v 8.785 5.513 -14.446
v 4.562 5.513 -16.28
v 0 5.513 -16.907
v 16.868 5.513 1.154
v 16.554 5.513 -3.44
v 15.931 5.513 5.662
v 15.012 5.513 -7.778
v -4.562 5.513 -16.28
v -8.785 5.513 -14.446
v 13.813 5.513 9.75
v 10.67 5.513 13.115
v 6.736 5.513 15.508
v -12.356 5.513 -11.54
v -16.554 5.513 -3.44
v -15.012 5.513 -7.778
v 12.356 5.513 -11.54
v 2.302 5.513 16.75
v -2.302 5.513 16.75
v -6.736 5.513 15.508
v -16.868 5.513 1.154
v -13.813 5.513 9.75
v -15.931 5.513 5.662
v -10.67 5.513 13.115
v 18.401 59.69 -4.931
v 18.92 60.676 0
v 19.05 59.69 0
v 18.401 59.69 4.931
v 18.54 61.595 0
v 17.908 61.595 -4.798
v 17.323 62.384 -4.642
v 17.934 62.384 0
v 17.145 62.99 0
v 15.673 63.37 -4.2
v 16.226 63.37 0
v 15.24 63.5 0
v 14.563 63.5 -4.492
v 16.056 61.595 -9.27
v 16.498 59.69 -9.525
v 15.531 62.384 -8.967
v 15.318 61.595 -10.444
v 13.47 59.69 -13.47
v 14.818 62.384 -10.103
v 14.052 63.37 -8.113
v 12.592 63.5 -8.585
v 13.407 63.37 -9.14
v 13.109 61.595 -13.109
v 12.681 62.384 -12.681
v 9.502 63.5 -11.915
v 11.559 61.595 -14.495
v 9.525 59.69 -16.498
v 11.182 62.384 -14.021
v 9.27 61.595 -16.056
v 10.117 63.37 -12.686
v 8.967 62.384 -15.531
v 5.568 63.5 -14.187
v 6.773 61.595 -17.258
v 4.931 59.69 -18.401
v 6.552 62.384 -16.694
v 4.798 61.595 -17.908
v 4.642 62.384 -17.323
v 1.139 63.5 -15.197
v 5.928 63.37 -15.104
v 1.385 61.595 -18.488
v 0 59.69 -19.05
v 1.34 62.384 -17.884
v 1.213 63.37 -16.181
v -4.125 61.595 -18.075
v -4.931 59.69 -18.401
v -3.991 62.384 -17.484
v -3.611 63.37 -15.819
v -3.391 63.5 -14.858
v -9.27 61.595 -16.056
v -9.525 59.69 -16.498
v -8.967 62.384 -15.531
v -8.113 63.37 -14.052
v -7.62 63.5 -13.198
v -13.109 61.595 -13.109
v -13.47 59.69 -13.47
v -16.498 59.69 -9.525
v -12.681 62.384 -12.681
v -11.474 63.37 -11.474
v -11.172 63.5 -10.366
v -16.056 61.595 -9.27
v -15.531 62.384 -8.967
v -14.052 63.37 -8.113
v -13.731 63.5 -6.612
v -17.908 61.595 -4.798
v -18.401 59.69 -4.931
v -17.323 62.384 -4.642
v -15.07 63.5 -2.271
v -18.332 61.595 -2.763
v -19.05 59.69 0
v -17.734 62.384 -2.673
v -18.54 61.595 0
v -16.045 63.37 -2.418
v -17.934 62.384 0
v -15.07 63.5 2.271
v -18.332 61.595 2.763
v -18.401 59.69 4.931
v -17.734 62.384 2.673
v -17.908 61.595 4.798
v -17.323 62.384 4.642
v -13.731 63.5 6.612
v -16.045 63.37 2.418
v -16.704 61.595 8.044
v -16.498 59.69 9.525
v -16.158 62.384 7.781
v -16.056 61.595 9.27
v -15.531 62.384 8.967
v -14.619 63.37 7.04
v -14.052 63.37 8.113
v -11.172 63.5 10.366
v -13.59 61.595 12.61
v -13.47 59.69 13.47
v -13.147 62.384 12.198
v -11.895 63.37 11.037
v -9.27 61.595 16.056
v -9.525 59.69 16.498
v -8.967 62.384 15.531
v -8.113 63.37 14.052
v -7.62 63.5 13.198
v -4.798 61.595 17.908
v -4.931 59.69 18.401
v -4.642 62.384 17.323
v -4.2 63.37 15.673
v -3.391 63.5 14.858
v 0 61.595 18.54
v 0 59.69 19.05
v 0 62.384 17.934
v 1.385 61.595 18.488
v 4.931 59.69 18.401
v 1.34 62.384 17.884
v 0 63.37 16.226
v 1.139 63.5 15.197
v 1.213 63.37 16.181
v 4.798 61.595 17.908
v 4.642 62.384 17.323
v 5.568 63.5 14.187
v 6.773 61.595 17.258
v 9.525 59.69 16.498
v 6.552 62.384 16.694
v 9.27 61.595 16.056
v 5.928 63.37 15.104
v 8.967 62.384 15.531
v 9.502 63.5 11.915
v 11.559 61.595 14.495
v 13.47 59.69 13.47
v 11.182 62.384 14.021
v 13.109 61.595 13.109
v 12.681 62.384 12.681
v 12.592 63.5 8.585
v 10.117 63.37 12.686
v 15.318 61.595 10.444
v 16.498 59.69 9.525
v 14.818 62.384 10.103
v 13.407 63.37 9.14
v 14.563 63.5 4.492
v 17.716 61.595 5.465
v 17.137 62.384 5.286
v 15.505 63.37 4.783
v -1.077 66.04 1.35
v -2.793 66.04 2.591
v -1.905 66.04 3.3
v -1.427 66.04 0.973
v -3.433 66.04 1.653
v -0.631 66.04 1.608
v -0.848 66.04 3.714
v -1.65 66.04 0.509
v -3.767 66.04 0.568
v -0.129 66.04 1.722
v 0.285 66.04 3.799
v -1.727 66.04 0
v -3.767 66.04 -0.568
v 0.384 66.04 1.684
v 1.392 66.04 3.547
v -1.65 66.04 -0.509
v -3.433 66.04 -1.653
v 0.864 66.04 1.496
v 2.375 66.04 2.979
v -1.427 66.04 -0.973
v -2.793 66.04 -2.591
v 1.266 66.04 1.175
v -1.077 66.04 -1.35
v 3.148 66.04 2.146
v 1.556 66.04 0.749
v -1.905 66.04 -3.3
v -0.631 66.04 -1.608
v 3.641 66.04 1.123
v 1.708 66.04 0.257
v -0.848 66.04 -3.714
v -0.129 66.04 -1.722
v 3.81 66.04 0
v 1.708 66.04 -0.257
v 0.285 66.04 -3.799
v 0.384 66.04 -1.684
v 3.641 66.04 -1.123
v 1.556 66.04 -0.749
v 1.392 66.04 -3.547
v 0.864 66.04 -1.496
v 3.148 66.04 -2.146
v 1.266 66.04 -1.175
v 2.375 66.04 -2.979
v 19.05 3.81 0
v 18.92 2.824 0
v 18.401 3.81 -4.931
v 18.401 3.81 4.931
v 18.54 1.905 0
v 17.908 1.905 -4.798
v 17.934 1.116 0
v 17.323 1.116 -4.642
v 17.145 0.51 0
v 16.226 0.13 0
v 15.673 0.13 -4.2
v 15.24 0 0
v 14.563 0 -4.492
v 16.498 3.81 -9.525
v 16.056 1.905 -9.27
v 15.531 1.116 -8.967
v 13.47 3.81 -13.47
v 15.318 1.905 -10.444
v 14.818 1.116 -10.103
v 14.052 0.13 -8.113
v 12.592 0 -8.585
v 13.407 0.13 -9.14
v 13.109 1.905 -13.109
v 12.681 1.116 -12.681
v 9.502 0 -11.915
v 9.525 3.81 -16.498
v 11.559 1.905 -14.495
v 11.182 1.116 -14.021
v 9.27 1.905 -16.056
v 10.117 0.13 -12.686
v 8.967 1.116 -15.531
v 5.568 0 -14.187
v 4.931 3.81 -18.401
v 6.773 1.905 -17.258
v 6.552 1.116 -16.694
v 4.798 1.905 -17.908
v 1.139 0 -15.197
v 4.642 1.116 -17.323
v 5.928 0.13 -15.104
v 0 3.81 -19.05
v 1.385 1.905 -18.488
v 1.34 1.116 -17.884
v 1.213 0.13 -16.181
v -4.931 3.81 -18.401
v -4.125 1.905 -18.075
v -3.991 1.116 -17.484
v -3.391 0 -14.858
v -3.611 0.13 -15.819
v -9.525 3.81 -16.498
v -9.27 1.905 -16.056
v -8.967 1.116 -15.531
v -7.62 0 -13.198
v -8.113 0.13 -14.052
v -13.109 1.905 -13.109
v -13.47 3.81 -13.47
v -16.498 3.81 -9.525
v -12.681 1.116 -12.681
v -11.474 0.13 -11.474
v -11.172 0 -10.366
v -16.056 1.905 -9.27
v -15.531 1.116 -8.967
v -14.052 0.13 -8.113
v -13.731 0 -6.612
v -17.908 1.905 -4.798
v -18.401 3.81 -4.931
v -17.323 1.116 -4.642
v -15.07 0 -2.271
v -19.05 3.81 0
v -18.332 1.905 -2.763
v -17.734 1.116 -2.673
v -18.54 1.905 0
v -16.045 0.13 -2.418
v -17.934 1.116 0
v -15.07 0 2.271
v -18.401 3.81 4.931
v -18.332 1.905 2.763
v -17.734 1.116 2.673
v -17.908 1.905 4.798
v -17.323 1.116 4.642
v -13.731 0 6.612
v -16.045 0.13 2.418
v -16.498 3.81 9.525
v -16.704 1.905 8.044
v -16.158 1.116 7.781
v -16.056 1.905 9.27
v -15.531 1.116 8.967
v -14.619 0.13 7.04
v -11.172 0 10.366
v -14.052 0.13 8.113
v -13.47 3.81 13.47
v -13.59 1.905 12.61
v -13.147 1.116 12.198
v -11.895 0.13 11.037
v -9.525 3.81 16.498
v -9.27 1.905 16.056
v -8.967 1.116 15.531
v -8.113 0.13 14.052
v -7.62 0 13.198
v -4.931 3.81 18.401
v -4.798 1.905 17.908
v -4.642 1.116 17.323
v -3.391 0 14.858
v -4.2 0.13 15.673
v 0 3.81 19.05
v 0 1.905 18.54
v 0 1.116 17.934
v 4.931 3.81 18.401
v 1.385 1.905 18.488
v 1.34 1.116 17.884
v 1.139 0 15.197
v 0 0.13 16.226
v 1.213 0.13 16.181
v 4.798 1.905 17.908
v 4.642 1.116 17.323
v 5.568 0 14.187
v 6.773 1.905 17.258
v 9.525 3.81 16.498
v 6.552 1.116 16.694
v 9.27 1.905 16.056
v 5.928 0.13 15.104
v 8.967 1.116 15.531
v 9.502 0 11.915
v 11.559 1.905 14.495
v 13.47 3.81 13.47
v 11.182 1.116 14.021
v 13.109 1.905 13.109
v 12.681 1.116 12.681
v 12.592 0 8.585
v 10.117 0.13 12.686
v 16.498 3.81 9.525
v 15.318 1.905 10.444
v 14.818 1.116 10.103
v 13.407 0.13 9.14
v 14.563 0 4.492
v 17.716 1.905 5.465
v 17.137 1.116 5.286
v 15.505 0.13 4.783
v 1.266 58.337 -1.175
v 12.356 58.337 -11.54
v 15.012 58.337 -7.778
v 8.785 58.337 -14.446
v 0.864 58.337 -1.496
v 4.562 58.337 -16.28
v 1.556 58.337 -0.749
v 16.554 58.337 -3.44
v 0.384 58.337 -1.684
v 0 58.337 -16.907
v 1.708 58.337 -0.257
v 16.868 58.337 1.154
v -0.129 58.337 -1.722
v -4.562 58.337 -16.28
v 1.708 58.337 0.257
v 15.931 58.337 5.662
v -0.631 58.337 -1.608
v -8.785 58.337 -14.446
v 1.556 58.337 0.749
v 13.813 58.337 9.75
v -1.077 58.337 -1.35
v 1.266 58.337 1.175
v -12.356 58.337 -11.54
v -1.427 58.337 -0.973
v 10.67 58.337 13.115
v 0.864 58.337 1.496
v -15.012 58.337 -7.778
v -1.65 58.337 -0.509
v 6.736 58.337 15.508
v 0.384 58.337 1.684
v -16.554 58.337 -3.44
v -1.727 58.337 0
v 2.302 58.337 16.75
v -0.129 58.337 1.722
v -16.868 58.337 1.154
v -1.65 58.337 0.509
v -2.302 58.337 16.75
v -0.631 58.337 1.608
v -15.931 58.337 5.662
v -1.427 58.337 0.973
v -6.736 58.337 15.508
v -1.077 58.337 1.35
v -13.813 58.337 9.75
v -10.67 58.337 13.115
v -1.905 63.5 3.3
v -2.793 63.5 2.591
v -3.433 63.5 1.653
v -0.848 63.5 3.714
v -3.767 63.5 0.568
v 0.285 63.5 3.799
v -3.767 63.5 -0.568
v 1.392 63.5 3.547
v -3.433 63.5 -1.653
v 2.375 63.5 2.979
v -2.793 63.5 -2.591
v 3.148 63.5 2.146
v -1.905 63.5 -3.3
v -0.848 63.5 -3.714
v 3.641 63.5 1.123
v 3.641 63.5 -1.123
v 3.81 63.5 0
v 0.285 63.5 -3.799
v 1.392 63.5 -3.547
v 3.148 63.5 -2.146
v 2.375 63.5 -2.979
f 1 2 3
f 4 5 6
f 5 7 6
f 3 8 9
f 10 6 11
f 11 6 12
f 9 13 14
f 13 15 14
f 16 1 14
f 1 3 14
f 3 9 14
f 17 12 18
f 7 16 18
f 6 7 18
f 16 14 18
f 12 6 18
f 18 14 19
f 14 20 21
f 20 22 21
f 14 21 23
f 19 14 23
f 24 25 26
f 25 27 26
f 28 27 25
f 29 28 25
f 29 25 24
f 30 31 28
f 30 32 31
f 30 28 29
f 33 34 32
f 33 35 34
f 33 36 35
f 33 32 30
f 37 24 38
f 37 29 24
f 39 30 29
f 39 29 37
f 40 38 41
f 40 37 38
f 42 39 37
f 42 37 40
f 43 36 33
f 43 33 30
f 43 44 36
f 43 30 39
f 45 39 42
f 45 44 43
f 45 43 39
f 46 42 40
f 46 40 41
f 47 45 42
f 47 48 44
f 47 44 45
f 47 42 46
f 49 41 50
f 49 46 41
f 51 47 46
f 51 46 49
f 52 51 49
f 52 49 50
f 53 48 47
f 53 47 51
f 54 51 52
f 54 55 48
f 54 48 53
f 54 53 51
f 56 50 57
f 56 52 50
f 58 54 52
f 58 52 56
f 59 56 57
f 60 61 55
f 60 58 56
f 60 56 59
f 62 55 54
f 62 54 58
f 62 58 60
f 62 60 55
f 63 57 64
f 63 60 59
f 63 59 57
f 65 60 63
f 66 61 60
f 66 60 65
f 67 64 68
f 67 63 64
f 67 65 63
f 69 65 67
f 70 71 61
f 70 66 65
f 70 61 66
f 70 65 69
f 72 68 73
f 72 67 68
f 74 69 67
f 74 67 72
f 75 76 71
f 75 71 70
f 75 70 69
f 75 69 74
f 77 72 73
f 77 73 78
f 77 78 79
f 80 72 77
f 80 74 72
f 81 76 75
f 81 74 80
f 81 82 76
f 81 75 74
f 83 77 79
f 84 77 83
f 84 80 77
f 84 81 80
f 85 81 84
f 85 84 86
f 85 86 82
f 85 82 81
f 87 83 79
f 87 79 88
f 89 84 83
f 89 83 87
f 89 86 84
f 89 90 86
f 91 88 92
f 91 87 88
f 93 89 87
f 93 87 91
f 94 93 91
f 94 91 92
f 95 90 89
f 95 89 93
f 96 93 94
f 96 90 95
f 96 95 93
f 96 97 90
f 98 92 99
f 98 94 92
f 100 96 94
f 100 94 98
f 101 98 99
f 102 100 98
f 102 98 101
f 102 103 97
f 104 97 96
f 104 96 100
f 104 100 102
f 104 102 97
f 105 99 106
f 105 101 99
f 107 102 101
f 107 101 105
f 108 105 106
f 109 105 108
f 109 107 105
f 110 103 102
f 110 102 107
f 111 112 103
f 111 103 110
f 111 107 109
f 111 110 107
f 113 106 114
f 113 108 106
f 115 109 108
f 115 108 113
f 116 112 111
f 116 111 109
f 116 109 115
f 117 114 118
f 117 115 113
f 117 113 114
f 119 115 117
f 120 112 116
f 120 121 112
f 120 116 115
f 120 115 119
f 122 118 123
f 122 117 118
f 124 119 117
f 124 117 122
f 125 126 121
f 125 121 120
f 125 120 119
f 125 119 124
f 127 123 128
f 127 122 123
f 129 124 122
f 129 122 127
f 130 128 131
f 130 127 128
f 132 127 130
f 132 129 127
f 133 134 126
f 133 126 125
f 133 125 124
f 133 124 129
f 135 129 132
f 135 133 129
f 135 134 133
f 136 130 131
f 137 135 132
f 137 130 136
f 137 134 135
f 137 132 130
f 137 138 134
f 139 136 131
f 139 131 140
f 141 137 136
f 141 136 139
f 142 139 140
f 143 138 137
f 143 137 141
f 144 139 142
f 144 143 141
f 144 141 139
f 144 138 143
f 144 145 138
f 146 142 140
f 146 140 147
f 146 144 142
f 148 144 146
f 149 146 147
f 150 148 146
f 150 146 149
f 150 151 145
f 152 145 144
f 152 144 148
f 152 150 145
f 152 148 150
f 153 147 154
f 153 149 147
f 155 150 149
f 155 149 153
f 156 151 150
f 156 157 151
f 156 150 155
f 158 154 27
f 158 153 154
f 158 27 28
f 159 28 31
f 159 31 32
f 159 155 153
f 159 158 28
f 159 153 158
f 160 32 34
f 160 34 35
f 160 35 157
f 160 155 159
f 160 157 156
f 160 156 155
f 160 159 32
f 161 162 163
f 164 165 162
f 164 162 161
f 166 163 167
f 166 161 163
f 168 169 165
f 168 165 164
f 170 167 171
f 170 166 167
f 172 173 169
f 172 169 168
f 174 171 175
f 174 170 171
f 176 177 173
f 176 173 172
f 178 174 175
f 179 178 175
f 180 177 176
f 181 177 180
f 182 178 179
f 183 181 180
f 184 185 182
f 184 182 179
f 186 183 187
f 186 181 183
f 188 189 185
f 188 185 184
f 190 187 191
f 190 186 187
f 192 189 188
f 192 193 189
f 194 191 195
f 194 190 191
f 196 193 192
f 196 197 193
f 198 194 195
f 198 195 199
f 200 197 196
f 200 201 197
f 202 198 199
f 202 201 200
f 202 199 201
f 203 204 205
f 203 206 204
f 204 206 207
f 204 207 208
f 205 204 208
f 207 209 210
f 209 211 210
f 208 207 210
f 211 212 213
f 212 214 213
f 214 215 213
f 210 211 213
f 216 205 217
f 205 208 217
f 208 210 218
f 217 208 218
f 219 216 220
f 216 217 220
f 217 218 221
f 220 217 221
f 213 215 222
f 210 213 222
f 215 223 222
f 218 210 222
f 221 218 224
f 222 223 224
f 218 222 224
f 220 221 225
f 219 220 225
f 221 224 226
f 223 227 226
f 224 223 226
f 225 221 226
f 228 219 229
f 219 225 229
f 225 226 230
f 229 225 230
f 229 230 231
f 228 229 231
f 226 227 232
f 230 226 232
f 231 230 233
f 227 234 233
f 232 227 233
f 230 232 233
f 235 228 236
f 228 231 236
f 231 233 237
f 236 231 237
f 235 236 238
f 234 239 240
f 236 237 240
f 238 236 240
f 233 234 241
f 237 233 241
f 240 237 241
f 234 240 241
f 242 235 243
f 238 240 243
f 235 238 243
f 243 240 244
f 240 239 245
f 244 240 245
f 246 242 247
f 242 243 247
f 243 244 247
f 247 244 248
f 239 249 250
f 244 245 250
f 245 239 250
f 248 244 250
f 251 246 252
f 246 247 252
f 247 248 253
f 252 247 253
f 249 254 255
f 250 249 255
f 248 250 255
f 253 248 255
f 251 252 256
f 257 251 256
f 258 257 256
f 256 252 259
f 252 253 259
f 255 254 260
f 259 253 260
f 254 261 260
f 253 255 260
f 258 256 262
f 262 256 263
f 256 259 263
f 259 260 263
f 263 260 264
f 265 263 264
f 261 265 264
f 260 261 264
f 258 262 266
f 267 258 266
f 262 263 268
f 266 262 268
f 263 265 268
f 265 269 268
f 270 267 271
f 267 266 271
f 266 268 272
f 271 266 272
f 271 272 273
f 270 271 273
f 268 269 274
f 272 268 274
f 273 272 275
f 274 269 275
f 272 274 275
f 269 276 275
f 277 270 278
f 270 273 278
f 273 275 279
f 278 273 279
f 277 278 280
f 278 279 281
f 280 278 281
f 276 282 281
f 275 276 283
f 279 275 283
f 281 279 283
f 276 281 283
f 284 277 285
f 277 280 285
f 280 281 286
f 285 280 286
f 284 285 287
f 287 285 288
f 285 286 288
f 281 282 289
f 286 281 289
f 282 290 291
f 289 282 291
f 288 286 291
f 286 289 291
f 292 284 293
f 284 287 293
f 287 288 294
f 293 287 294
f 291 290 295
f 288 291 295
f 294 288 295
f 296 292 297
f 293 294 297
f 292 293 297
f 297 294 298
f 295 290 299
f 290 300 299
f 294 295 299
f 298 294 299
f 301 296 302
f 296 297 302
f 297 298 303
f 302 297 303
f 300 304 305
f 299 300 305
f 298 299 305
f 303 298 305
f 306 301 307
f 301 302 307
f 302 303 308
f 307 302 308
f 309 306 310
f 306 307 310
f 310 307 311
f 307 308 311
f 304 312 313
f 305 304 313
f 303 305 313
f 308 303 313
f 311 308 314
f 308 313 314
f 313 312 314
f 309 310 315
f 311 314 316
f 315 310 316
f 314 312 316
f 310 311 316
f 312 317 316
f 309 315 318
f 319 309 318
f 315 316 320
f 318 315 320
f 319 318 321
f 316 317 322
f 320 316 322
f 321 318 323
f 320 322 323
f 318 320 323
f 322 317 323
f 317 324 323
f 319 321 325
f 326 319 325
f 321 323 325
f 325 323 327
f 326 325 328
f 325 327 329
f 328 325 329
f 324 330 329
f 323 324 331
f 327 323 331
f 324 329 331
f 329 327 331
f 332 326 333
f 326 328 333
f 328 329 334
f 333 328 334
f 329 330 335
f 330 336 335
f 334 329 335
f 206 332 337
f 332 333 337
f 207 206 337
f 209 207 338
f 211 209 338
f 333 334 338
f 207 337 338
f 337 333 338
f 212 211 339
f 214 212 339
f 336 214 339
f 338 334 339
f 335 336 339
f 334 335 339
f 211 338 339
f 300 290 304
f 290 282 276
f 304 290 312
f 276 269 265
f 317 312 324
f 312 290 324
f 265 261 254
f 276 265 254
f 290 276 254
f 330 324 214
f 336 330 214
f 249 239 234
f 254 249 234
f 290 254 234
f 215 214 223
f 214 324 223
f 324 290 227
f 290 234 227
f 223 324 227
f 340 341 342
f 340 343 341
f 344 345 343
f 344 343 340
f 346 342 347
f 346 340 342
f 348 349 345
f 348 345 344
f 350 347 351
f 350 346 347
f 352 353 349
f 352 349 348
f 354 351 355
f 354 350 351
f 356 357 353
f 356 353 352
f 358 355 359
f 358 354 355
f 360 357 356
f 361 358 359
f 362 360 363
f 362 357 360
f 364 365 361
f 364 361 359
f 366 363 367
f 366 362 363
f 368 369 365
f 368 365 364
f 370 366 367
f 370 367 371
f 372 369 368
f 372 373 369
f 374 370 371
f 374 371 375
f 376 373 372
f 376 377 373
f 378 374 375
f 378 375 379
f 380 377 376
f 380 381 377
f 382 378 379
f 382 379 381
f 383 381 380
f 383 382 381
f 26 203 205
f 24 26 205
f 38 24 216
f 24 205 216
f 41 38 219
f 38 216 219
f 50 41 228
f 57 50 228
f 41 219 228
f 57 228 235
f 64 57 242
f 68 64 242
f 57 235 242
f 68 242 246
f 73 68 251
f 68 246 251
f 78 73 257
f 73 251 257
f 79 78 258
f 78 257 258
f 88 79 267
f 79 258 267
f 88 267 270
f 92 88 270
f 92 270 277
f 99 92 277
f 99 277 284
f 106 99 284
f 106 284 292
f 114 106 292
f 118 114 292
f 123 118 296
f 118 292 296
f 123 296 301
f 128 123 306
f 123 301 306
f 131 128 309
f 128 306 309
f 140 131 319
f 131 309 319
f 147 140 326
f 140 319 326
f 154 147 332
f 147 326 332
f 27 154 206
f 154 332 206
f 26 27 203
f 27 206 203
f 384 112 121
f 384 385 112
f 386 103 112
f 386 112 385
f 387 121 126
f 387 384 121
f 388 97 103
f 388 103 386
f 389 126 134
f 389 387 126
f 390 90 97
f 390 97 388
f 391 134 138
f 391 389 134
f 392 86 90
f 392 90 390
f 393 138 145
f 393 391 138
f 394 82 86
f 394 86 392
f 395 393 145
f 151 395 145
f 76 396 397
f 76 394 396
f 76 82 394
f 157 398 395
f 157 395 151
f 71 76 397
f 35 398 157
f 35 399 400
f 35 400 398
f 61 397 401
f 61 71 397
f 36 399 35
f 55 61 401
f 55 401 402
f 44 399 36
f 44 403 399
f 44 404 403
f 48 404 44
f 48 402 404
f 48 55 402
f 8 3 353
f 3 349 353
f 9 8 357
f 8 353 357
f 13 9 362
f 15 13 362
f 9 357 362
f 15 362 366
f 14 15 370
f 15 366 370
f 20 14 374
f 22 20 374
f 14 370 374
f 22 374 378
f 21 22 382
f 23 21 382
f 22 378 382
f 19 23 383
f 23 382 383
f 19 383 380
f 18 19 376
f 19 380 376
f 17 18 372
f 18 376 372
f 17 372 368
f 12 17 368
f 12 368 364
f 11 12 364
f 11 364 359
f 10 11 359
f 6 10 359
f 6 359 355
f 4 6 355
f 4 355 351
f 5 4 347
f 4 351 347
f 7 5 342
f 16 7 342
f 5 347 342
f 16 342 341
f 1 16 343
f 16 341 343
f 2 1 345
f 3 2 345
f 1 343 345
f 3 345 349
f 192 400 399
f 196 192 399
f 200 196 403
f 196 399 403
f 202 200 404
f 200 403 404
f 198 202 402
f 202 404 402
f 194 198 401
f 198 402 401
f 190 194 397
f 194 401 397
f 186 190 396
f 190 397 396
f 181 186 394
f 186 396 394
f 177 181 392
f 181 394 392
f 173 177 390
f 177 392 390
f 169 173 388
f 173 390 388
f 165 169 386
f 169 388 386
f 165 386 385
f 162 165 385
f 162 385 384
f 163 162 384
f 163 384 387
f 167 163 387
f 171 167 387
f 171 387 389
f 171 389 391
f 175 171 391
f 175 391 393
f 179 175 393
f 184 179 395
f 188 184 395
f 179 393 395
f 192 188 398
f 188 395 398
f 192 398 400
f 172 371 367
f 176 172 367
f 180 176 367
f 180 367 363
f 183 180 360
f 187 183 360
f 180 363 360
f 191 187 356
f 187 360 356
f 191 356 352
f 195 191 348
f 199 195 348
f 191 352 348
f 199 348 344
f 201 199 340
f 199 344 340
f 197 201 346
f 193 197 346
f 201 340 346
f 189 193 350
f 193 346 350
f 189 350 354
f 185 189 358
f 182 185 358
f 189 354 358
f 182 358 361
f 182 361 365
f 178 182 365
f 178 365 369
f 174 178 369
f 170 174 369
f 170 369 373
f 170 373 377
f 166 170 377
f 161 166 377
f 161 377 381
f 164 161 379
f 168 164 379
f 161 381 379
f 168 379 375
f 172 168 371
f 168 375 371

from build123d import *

# Parameters (mm, degrees)
SKETCH1_R                 = 19.05
BOSS_EXTRUDE1_DEPTH       = 63.5
FILLET1_R                 = 3.81
SKETCH2_R                 = 3.81
BOSS_EXTRUDE2_DEPTH       = 2.54
F_8_32_TAPPED_HOLE1_D     = 3.4544
F_8_32_TAPPED_HOLE1_DEPTH = 12.53744
F_8_32_TAPPED_HOLE1_TIP   = 1.037806461
SKETCH6_W                 = 16.907326274
SKETCH6_H                 = 52.824444264


with BuildPart() as part:
    # Sketch1 → Boss-Extrude1 (new body)
    with BuildSketch(Plane(origin=(0, 0, 0), x_dir=(1, 0, 0), z_dir=(0, 1, 0))):
        Circle(SKETCH1_R)
    extrude(amount=BOSS_EXTRUDE1_DEPTH)

    # Fillet1
    fillet1_edges = [part.edges().sort_by_distance(p)[0] for p in [
        (-19.05, 0, 0),
        (-19.05, 63.5, 0),
    ]]
    fillet(fillet1_edges, radius=FILLET1_R)

    # Sketch2 → Boss-Extrude2 (add)
    with BuildSketch(Plane(origin=(0, 63.5, 0), x_dir=(1, 0, 0), z_dir=(0, 1, 0))):
        Circle(SKETCH2_R)
    extrude(amount=BOSS_EXTRUDE2_DEPTH)

    # #8-32 Tapped Hole1
    with Locations(Plane(origin=(0, 66.04, 0), x_dir=(1, 0, 0), z_dir=(0, 1, 0))):
        with Locations((0, 0)):
            Hole(F_8_32_TAPPED_HOLE1_D / 2, depth=F_8_32_TAPPED_HOLE1_DEPTH)
            with Locations((0, 0, -(F_8_32_TAPPED_HOLE1_DEPTH + F_8_32_TAPPED_HOLE1_TIP / 2))):  # 118° drill point
                Cone(0, F_8_32_TAPPED_HOLE1_D / 2, F_8_32_TAPPED_HOLE1_TIP, mode=Mode.SUBTRACT)

    # Sketch6 → Cut-Revolve1 (revolve, cut)
    with BuildSketch(Plane(origin=(0, 0, 0), x_dir=(0, 0, -1), z_dir=(1, 0, 0))):
        with Locations((8.453663137, 31.924965915)):
            Rectangle(SKETCH6_W, SKETCH6_H)
    revolve(axis=Axis((0, 5.512743783, 0), (0, 1, 0)), mode=Mode.SUBTRACT)


solid = part.part
